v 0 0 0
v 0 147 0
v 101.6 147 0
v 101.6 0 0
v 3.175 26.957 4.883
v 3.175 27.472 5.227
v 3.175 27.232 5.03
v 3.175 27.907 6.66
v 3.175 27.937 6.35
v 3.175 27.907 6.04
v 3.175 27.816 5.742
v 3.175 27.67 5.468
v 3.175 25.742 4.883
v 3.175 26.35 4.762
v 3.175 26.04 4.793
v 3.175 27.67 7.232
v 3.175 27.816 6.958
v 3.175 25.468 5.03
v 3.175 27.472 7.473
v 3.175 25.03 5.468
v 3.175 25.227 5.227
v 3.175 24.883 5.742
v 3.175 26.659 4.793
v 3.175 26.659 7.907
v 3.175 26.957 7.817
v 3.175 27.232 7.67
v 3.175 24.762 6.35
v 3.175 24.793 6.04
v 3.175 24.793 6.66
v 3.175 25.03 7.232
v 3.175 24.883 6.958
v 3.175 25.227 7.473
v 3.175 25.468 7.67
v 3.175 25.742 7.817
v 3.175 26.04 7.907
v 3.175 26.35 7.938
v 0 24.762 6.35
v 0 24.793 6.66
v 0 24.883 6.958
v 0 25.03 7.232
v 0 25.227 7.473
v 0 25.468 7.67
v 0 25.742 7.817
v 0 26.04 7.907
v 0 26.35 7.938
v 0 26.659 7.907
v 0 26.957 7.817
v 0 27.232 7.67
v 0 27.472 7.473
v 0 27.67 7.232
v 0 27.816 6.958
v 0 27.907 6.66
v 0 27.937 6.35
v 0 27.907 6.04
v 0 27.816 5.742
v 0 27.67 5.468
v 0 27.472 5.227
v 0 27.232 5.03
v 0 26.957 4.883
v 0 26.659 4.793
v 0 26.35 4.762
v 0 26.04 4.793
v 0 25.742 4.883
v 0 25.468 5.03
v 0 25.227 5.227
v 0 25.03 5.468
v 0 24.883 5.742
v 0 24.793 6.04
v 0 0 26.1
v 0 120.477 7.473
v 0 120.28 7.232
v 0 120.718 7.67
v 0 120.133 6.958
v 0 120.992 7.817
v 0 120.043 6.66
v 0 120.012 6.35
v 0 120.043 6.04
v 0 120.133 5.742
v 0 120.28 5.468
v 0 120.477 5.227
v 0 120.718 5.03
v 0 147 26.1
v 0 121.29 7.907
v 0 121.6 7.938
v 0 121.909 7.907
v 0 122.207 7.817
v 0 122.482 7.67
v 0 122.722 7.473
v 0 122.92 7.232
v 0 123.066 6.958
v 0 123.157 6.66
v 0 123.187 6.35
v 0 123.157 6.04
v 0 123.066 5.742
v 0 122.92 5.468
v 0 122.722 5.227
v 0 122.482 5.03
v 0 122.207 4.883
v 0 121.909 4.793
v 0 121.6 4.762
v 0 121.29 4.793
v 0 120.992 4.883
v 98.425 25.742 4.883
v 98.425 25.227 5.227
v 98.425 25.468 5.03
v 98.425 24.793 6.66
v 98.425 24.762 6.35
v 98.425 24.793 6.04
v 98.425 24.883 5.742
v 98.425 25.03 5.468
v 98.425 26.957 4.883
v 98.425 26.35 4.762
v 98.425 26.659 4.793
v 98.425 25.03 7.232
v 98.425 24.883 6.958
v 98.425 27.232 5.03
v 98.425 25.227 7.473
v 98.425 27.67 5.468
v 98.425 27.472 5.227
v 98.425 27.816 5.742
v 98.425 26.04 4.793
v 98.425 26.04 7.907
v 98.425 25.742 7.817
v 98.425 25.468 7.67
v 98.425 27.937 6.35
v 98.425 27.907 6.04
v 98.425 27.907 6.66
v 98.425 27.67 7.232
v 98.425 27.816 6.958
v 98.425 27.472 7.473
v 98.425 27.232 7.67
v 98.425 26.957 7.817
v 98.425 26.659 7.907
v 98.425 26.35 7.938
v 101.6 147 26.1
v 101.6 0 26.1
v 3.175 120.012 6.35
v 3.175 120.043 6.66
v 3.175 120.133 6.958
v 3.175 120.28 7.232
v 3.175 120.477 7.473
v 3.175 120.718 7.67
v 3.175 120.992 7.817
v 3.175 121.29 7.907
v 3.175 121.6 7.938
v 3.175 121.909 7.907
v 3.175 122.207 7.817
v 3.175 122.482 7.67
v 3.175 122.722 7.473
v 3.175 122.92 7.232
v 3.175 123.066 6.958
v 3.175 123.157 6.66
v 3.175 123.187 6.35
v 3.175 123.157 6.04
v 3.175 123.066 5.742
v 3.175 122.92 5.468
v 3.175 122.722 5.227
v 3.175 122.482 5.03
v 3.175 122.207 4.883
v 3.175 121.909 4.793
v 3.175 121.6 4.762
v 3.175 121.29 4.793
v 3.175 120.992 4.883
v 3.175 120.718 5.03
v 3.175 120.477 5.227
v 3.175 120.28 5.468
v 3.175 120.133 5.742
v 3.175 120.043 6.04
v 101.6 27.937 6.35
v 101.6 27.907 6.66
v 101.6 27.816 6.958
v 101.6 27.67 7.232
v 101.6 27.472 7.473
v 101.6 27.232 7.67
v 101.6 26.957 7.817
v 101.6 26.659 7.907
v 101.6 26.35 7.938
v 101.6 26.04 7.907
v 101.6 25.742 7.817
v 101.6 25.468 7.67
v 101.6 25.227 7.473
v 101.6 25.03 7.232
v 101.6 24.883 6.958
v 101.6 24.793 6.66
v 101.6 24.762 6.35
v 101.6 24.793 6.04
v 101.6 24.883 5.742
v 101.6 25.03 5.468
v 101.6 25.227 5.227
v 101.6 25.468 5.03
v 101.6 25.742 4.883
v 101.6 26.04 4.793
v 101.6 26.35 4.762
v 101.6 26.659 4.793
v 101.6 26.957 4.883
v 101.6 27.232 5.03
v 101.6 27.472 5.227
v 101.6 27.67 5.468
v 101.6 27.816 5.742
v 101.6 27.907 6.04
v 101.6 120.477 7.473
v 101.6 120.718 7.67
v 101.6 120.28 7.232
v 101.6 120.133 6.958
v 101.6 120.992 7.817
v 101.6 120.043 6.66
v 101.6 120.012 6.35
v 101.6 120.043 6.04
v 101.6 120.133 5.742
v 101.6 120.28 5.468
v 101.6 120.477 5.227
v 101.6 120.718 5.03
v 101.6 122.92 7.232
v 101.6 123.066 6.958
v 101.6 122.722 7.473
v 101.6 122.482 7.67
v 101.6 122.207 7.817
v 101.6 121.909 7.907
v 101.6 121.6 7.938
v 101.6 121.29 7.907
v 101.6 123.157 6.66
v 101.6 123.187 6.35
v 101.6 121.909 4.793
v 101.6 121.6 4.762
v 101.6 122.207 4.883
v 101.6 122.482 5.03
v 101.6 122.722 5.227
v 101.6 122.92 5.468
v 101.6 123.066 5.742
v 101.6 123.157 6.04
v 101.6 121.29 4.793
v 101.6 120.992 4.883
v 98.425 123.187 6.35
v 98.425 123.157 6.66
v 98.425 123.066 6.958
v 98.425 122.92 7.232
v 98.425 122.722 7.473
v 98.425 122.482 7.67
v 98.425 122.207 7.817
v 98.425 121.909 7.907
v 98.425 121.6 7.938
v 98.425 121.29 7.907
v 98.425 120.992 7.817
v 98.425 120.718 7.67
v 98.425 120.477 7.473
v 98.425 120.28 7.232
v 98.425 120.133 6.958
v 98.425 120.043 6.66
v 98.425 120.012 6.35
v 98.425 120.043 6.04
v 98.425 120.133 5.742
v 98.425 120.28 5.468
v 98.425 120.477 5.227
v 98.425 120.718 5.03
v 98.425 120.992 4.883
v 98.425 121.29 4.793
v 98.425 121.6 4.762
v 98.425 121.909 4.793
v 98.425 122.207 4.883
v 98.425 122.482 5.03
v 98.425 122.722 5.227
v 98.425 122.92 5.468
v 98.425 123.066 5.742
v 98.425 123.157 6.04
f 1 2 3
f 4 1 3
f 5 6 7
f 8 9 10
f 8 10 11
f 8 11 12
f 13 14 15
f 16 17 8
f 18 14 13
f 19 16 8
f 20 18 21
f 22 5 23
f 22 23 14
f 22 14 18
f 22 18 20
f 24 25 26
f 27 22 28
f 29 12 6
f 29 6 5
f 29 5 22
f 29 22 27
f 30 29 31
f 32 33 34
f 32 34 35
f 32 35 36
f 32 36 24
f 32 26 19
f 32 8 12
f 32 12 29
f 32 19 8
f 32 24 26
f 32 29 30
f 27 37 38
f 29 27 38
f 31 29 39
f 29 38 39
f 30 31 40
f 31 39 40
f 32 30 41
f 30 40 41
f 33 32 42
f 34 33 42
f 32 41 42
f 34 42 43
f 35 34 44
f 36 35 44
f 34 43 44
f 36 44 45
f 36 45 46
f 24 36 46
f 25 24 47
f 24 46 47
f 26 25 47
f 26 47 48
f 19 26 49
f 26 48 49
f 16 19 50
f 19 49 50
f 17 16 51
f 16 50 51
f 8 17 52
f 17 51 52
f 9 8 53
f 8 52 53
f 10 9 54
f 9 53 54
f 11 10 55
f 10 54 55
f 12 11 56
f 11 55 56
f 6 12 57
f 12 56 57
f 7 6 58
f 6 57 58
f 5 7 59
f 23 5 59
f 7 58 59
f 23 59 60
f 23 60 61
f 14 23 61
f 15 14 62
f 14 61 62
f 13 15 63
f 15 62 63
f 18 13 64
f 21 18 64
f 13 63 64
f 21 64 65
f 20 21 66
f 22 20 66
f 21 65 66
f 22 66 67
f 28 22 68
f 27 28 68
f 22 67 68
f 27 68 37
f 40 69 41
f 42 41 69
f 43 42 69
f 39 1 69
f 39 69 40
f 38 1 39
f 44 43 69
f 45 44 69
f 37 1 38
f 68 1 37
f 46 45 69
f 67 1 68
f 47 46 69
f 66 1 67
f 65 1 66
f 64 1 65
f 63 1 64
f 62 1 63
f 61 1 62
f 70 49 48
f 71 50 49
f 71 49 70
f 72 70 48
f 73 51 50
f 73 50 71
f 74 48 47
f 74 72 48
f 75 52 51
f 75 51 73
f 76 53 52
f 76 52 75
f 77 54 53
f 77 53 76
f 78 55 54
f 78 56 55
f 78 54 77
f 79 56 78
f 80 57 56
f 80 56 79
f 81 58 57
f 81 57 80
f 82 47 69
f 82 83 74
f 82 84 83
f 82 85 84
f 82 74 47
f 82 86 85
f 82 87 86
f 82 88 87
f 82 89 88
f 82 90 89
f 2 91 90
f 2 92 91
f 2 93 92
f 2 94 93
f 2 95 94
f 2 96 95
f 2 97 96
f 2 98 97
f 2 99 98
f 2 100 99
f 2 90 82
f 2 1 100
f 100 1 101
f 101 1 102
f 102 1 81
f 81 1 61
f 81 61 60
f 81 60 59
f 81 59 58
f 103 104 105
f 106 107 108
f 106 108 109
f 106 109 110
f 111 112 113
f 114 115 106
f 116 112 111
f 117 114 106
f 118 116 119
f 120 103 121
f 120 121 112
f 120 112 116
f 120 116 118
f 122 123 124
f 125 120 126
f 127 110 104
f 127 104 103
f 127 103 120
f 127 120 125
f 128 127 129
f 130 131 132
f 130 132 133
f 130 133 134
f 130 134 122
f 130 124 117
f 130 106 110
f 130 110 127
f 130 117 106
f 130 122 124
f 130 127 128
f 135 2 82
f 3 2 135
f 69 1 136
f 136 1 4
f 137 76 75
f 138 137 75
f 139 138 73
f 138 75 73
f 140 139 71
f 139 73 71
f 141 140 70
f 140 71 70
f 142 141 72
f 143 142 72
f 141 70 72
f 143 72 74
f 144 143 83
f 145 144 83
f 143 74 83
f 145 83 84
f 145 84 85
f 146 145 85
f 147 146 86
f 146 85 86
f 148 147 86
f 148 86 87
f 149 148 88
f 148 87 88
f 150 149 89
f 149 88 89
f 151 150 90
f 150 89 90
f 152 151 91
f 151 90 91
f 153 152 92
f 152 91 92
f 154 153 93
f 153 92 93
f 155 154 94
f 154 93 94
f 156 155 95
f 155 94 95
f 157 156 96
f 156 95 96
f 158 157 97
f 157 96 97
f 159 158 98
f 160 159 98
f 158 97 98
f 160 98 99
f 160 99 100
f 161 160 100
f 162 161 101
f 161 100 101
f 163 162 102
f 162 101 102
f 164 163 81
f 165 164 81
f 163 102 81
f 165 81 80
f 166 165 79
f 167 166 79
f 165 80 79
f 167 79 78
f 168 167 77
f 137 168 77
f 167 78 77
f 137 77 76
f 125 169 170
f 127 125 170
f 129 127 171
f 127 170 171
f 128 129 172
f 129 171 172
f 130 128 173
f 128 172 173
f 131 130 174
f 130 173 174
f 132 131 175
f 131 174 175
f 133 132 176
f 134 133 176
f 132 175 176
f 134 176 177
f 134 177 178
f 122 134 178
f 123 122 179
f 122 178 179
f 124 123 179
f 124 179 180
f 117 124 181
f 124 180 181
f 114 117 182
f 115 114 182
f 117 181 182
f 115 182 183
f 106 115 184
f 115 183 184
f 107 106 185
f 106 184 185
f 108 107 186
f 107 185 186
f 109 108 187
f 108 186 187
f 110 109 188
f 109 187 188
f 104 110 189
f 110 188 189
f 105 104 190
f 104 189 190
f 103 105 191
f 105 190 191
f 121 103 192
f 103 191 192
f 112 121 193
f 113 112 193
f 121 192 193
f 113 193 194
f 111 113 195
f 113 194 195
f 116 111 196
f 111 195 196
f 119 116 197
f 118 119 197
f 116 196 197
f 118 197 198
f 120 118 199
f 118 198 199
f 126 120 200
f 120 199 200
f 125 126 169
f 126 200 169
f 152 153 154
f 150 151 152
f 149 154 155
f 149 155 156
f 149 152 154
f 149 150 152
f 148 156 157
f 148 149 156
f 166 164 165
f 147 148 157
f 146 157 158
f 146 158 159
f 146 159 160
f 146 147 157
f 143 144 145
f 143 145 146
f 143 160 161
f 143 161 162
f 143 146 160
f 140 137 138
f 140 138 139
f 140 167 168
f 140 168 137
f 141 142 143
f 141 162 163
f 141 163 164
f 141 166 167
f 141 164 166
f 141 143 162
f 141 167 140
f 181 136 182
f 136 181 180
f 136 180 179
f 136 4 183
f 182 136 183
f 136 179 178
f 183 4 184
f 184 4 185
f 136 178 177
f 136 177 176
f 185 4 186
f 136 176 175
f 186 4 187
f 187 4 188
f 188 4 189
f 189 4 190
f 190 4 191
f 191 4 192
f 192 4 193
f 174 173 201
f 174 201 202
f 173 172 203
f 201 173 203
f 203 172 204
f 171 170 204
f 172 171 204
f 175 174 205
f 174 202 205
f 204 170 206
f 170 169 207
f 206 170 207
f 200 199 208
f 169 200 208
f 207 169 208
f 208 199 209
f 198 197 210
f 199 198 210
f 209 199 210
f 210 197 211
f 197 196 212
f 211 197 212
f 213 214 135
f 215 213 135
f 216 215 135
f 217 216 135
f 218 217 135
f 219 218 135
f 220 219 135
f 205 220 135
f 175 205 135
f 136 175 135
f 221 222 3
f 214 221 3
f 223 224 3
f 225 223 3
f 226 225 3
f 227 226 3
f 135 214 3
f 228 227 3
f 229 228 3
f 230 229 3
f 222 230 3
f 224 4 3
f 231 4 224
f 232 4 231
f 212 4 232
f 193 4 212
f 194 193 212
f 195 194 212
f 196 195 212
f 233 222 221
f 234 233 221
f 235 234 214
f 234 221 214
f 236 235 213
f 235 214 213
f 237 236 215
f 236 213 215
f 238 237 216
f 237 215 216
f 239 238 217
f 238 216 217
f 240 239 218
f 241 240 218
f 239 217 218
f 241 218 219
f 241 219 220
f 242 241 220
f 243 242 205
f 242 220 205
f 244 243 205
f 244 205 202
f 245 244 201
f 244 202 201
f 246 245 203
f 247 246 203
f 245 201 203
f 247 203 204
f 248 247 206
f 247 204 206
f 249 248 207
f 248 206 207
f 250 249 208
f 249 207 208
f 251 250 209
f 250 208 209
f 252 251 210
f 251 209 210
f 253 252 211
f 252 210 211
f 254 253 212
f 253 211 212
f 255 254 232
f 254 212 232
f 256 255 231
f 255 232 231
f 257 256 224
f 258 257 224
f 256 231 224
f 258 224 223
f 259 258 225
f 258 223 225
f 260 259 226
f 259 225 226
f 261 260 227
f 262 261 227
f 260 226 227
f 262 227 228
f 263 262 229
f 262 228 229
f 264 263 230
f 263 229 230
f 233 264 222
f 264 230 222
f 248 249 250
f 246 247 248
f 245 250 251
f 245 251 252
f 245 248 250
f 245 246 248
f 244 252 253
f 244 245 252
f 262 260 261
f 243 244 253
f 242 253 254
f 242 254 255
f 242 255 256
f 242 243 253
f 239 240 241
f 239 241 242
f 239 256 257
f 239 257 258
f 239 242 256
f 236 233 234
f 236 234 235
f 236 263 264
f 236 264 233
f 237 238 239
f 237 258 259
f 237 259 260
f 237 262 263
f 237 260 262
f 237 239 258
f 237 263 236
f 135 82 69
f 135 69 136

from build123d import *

# Parameters (mm, degrees)
F0_W     = 101.5996952
F0_H     = 146.9995536
F1_DEPTH = 26.0999224
F2_R     = 1.5875
F3_DEPTH = 3.175
F4_R     = 1.5875
F5_DEPTH = 3.175


with BuildPart() as f1:
    # F0 (on Top) → F1 (new body)
    with BuildSketch(Plane.XY):
        with Locations((50.7998476, 73.4997768)):
            Rectangle(F0_W, F0_H)
    extrude(amount=F1_DEPTH)

    # F2 (on face) → F3 (cut)
    with BuildSketch(Plane(origin=(0, 0, 0), x_dir=(0, -1, 0), z_dir=(-1, 0, 0))):
        with Locations((-121.5995536, 6.35)):
            Circle(F2_R)
        with Locations((-26.3495536, 6.35)):
            Circle(F2_R)
    extrude(amount=-F3_DEPTH, mode=Mode.SUBTRACT)

    # F4 (on face) → F5 (cut)
    with BuildSketch(Plane.YZ.offset(101.5996952)):
        with Locations((26.3495536, 6.35)):
            Circle(F4_R)
        with Locations((121.5995536, 6.35)):
            Circle(F4_R)
    extrude(amount=-F5_DEPTH, mode=Mode.SUBTRACT)


solid = f1.part
